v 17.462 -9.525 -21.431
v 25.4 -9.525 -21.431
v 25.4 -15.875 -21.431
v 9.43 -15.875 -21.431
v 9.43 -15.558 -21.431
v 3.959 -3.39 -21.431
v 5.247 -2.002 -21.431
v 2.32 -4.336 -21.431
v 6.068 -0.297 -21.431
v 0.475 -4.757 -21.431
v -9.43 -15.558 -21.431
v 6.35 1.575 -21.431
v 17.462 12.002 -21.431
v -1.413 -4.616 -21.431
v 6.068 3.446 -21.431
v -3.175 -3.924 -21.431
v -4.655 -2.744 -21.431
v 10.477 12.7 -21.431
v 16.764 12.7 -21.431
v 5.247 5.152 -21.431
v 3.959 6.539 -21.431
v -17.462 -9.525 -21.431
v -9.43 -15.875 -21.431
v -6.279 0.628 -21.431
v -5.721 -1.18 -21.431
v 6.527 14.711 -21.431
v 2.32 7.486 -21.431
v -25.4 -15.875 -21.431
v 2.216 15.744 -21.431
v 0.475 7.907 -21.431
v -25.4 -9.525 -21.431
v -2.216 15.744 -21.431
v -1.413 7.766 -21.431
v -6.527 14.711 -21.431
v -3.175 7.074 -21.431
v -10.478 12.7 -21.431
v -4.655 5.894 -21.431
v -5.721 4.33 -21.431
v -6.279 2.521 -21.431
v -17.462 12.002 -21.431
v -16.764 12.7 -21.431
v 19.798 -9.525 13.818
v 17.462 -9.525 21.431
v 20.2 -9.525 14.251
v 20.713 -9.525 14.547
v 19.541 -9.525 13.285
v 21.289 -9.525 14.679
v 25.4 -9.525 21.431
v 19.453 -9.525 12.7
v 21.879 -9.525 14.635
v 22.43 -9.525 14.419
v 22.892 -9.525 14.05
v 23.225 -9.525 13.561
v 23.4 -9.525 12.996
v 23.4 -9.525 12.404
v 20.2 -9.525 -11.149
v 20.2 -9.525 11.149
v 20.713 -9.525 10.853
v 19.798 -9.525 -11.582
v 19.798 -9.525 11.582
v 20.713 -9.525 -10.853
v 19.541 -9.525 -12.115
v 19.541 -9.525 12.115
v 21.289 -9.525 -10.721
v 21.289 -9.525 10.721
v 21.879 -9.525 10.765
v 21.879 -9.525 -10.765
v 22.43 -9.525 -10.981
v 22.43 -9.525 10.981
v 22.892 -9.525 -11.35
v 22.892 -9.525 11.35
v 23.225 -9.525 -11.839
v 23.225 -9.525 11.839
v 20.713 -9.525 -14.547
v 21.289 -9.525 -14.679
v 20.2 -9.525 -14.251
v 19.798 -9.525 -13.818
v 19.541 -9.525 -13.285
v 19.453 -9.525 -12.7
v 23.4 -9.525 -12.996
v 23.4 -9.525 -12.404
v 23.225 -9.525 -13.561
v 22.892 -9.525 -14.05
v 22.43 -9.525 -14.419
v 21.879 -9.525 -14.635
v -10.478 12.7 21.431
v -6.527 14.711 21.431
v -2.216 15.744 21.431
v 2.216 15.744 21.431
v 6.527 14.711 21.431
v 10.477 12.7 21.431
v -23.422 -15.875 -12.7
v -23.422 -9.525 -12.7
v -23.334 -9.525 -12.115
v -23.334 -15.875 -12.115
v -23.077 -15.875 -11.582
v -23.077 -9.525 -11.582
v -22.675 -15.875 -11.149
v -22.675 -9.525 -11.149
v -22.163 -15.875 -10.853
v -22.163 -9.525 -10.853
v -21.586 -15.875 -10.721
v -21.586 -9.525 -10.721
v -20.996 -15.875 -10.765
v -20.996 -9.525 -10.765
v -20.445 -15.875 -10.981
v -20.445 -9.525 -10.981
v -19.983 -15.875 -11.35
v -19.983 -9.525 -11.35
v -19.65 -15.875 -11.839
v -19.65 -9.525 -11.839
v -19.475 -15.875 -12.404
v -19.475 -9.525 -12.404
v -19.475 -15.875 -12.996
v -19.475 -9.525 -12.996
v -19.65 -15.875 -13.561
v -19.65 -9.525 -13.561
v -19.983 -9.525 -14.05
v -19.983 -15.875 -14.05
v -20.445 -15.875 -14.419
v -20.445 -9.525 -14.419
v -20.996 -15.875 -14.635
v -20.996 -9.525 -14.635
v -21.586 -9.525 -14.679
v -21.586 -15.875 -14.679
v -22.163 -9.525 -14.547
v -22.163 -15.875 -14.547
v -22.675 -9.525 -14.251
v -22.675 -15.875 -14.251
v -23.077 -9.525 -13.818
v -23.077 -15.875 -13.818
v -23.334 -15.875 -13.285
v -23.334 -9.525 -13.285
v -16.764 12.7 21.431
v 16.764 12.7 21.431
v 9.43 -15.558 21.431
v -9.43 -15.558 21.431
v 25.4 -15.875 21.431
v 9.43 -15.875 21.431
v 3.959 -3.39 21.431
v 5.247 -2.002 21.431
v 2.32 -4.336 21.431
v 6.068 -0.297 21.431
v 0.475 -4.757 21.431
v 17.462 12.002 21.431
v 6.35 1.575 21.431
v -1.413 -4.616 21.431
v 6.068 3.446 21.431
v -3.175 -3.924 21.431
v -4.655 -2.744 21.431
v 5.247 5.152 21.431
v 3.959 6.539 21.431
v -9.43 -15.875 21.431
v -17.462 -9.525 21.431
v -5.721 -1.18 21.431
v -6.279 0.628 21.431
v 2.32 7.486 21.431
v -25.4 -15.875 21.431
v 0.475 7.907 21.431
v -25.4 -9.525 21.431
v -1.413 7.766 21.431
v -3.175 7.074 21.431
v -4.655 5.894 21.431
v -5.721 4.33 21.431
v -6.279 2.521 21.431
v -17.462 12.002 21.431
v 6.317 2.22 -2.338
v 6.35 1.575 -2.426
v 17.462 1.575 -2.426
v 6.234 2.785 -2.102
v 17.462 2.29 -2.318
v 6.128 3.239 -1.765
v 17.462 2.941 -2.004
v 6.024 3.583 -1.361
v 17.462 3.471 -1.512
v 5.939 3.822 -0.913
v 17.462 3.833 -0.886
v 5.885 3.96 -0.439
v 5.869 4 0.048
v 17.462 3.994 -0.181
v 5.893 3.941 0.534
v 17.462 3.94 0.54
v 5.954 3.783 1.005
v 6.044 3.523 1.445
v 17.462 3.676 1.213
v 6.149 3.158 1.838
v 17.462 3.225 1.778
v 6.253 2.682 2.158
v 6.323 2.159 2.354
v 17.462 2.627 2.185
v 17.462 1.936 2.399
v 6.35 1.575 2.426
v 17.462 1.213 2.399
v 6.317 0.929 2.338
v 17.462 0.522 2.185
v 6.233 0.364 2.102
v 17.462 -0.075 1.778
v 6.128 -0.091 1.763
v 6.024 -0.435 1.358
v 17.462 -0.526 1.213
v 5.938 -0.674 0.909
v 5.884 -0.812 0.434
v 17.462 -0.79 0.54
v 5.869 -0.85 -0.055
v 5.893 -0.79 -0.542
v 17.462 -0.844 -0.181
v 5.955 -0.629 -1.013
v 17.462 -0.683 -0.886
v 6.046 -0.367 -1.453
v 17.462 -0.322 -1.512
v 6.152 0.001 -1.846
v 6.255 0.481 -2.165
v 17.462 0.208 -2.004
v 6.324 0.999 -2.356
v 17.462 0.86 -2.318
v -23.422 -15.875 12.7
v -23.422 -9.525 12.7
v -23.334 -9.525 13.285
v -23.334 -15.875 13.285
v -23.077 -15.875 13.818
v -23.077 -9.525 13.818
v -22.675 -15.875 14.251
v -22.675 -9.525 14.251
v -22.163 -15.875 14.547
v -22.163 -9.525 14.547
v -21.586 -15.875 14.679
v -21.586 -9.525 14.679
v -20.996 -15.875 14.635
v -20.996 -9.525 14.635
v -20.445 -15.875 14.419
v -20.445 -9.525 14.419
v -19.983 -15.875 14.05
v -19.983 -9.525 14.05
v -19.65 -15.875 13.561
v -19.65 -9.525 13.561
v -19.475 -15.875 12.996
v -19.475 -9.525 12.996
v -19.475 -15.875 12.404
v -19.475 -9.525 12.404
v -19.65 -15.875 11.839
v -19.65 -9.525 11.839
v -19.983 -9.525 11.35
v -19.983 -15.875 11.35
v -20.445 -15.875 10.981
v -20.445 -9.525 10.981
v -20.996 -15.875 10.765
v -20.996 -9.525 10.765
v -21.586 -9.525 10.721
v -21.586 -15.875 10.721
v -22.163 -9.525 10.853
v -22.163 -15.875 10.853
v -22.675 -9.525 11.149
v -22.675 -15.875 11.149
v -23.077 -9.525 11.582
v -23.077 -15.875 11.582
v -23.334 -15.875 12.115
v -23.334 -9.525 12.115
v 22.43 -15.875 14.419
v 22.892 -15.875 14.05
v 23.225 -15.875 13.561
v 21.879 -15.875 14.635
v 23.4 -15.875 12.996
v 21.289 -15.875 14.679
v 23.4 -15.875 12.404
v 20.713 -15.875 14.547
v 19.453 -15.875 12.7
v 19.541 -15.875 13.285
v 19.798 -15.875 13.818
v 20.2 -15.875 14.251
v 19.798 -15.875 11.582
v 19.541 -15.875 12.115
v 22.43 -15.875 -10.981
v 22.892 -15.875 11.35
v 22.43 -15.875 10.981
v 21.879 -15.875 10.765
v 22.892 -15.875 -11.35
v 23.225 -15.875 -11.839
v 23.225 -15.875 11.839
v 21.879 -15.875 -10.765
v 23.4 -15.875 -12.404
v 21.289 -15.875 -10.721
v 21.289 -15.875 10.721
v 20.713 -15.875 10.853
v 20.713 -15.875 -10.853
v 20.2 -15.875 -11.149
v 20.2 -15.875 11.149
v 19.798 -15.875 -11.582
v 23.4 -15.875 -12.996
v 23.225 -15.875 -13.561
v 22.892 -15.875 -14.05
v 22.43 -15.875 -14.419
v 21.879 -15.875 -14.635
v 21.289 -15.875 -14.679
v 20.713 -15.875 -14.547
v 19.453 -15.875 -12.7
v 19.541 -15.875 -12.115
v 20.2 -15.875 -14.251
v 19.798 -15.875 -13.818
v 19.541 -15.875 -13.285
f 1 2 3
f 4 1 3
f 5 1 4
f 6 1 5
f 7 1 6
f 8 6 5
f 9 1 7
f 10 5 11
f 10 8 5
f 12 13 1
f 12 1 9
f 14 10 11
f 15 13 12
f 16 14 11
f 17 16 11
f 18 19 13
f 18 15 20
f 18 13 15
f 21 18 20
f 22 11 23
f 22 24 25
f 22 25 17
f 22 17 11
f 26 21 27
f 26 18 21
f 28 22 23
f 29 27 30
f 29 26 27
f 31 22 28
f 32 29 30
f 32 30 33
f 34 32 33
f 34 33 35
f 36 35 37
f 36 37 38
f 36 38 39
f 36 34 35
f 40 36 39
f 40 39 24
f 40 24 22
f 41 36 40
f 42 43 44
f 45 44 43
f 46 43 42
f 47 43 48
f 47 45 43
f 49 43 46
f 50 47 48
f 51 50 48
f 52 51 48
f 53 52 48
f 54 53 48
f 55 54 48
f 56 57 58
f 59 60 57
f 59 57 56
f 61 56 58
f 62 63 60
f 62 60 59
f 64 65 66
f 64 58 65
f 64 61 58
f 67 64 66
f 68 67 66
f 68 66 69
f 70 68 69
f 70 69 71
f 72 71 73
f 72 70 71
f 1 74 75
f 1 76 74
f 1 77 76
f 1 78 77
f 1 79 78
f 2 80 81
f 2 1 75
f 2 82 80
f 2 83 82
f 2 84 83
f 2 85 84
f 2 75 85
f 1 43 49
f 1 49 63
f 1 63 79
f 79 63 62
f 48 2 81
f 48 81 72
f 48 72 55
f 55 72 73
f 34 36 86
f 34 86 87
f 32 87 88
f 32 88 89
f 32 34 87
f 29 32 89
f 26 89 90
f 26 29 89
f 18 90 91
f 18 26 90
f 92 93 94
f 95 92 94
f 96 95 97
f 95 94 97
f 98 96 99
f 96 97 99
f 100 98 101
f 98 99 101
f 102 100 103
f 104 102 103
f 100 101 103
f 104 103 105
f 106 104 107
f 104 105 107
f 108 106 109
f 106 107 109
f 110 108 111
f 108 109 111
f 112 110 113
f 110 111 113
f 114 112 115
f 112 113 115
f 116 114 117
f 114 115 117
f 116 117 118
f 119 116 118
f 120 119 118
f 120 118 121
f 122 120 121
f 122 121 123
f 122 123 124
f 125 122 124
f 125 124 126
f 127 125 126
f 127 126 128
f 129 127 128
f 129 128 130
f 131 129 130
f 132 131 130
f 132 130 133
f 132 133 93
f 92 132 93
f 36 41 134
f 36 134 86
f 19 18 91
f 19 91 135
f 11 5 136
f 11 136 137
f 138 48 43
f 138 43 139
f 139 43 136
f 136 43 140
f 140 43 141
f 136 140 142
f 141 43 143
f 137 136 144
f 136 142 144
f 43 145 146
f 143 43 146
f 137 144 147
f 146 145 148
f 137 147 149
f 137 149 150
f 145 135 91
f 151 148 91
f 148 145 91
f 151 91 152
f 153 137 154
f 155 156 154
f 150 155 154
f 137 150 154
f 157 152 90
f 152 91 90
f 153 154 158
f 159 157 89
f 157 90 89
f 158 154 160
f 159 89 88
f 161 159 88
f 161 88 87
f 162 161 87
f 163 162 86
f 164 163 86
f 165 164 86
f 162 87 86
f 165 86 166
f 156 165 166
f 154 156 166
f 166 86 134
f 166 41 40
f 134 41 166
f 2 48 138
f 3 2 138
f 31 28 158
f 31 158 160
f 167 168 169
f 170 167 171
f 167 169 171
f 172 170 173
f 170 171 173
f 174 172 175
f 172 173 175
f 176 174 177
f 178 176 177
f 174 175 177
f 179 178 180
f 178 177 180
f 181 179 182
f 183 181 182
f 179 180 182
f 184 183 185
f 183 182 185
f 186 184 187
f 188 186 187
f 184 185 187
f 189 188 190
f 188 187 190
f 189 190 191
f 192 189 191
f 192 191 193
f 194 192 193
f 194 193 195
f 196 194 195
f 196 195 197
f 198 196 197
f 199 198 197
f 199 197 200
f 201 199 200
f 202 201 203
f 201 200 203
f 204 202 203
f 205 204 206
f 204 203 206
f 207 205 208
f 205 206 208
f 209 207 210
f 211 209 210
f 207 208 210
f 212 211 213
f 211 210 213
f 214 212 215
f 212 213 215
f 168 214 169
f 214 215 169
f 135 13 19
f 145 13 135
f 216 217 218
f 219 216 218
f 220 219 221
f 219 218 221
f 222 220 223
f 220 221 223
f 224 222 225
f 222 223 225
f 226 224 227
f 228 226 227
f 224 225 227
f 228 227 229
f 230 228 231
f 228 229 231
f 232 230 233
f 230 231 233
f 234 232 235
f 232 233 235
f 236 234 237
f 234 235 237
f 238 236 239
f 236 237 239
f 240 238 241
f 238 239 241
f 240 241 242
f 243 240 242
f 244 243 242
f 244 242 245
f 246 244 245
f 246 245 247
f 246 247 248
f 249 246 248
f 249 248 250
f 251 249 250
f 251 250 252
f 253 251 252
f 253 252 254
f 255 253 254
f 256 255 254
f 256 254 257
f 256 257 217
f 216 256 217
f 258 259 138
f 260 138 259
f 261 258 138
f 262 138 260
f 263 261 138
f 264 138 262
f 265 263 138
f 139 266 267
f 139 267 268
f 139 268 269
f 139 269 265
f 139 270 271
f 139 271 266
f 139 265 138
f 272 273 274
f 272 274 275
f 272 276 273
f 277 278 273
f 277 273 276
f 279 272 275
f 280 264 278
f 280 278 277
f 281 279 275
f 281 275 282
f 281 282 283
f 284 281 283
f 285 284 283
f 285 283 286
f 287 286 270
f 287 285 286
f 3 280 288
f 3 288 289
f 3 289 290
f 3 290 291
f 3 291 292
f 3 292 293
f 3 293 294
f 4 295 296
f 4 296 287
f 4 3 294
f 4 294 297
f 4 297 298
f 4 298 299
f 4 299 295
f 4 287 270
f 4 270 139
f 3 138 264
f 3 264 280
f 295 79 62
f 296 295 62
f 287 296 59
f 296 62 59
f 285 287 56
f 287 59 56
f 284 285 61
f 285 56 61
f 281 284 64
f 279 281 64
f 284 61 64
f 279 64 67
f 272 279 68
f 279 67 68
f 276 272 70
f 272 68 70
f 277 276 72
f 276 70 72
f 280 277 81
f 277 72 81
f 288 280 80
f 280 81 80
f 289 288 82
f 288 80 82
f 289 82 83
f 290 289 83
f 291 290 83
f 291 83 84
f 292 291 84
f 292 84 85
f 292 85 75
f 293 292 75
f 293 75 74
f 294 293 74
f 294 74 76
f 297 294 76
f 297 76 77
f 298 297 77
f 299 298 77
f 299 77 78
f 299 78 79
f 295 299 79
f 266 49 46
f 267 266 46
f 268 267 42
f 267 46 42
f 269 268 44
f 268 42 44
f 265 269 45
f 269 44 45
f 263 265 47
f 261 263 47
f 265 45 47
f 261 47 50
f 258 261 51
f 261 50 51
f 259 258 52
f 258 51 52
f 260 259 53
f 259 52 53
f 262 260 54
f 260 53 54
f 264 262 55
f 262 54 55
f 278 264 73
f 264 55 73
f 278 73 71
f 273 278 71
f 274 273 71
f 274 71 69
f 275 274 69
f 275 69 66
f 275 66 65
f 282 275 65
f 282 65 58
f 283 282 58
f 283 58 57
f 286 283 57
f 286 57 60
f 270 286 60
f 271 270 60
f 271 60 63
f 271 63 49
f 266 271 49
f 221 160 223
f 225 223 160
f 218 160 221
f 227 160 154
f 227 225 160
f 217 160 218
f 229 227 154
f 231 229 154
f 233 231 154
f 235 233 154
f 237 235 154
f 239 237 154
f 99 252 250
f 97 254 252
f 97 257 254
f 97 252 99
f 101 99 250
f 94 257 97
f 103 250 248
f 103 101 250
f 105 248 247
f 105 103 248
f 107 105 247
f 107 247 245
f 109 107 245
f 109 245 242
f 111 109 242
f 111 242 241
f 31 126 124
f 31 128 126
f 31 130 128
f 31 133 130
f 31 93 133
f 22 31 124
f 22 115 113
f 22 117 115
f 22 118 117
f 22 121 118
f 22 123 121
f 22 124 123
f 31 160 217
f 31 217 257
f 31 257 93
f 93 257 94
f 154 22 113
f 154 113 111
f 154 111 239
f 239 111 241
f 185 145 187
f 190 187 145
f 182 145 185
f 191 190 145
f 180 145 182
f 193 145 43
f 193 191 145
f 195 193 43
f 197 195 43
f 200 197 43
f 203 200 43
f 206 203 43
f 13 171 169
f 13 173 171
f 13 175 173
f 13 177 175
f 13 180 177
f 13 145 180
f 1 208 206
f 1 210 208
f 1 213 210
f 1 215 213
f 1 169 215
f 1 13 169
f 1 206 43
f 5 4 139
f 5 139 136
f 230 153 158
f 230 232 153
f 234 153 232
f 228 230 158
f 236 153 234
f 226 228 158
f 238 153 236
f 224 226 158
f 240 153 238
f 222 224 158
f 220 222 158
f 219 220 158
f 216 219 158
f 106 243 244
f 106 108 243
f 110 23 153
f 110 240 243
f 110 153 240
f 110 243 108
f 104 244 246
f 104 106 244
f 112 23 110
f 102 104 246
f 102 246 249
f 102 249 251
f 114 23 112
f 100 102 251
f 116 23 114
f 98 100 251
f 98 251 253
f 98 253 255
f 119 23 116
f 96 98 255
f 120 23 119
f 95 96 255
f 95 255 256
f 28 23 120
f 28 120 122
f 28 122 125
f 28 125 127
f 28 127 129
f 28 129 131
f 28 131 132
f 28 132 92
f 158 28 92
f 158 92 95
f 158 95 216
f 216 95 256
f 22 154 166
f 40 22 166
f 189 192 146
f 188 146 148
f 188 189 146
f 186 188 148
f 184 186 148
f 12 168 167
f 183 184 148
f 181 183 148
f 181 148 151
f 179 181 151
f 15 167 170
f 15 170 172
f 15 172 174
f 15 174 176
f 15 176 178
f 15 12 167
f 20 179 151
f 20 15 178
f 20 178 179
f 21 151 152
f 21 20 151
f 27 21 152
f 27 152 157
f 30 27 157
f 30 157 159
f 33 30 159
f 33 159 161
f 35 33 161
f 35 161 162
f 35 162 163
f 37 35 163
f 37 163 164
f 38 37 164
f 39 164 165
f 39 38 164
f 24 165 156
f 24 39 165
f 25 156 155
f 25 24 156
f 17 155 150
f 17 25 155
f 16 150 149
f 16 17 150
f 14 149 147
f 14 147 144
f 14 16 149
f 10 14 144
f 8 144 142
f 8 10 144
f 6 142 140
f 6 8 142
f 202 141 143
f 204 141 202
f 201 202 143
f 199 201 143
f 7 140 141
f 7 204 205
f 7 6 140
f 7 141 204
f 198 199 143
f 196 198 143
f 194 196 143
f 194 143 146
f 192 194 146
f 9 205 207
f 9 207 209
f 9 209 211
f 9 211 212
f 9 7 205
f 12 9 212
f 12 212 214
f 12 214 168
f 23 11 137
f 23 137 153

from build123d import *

# Parameters (mm, degrees)
BOSS_EXTRUDE1_START     = -21.43125
SKETCH4_R               = 6.35
BOSS_EXTRUDE1_DEPTH     = 42.8625
SKETCH5_R               = 1.984375
CUT_EXTRUDE1_DEPTH      = 42.828441001
CHAMFER1_SIZE           = 0.6985
CUT_EXTRUDE3_REACH      = 52.483
CUT_EXTRUDE3_END_RADIUS = 6.35
SKETCH7_R               = 2.4257


with BuildPart() as part:
    # Sketch4 → Boss-Extrude1 (new body)
    with BuildSketch(Plane.XY.offset(BOSS_EXTRUDE1_START)):
        with BuildLine():
            Line((-25.4, -9.525), (-17.4625, -9.525))
            Line((-17.4625, -9.525), (-17.4625, 12.7))
            Line((-17.4625, 12.7), (-10.4775, 12.7))
            ThreePointArc((-10.4775, 12.7), (0, 15.875), (10.4775, 12.7))
            Line((10.4775, 12.7), (17.4625, 12.7))
            Line((17.4625, 12.7), (17.4625, -9.525))
            Line((17.4625, -9.525), (25.4, -9.525))
            Line((25.4, -9.525), (25.4, -15.875))
            Line((25.4, -15.875), (9.42975, -15.875))
            Line((9.42975, -15.875), (9.42975, -15.5575))
            Line((9.42975, -15.5575), (-9.42975, -15.5575))
            Line((-9.42975, -15.5575), (-9.42975, -15.875))
            Line((-9.42975, -15.875), (-25.4, -15.875))
            Line((-25.4, -15.875), (-25.4, -9.525))
        make_face()
        with Locations((0, 1.5748)):
            Circle(SKETCH4_R, mode=Mode.SUBTRACT)
    extrude(amount=BOSS_EXTRUDE1_DEPTH)

    # Sketch5 → Cut-Extrude1 (cut, through all)
    with BuildSketch(Plane(origin=(0, -9.525, 0), x_dir=(1, 0, 0), z_dir=(0, 1, 0))):
        with Locations(Location((-21.4376, 12.7, 0), (0, 0, 180))):
            Circle(SKETCH5_R)
        with Locations(Location((21.4376, 12.7, 0), (0, 0, 180))):
            Circle(SKETCH5_R)
        with Locations(Location((21.4376, -12.7, 0), (0, 0, 180))):
            Circle(SKETCH5_R)
        with Locations(Location((-21.4376, -12.7, 0), (0, 0, 180))):
            Circle(SKETCH5_R)
    extrude(amount=-CUT_EXTRUDE1_DEPTH, mode=Mode.SUBTRACT)

    # Chamfer1
    chamfer1_edges = [part.edges().sort_by_distance(p)[0] for p in [
        (-17.4625, 12.7, 0),
        (17.4625, 12.7, 0),
    ]]
    chamfer(chamfer1_edges, length=CHAMFER1_SIZE)

    # Cut-Extrude3: up to this cylinder (the profile starts outside it)
    cut_extrude3_end = Plane(origin=(0, 1.5748, 0), z_dir=(0, 0, -1)) * Cylinder(CUT_EXTRUDE3_END_RADIUS, 118.666, mode=Mode.PRIVATE)
    # Sketch7 → Cut-Extrude3 (cut, up to the surface)
    with BuildSketch(Plane(origin=(17.4625, 0, 0), x_dir=(0, 0, -1), z_dir=(1, 0, 0)), mode=Mode.PRIVATE) as cut_extrude3_sk1:
        with Locations((0, 1.5748)):
            Circle(SKETCH7_R)
    cut_extrude3_tool1 = extrude(cut_extrude3_sk1.sketch, amount=-CUT_EXTRUDE3_REACH, mode=Mode.PRIVATE) - cut_extrude3_end
    add(cut_extrude3_tool1.solids().sort_by_distance((17.4625, 1.5748, 0))[0], mode=Mode.SUBTRACT)


solid = part.part
